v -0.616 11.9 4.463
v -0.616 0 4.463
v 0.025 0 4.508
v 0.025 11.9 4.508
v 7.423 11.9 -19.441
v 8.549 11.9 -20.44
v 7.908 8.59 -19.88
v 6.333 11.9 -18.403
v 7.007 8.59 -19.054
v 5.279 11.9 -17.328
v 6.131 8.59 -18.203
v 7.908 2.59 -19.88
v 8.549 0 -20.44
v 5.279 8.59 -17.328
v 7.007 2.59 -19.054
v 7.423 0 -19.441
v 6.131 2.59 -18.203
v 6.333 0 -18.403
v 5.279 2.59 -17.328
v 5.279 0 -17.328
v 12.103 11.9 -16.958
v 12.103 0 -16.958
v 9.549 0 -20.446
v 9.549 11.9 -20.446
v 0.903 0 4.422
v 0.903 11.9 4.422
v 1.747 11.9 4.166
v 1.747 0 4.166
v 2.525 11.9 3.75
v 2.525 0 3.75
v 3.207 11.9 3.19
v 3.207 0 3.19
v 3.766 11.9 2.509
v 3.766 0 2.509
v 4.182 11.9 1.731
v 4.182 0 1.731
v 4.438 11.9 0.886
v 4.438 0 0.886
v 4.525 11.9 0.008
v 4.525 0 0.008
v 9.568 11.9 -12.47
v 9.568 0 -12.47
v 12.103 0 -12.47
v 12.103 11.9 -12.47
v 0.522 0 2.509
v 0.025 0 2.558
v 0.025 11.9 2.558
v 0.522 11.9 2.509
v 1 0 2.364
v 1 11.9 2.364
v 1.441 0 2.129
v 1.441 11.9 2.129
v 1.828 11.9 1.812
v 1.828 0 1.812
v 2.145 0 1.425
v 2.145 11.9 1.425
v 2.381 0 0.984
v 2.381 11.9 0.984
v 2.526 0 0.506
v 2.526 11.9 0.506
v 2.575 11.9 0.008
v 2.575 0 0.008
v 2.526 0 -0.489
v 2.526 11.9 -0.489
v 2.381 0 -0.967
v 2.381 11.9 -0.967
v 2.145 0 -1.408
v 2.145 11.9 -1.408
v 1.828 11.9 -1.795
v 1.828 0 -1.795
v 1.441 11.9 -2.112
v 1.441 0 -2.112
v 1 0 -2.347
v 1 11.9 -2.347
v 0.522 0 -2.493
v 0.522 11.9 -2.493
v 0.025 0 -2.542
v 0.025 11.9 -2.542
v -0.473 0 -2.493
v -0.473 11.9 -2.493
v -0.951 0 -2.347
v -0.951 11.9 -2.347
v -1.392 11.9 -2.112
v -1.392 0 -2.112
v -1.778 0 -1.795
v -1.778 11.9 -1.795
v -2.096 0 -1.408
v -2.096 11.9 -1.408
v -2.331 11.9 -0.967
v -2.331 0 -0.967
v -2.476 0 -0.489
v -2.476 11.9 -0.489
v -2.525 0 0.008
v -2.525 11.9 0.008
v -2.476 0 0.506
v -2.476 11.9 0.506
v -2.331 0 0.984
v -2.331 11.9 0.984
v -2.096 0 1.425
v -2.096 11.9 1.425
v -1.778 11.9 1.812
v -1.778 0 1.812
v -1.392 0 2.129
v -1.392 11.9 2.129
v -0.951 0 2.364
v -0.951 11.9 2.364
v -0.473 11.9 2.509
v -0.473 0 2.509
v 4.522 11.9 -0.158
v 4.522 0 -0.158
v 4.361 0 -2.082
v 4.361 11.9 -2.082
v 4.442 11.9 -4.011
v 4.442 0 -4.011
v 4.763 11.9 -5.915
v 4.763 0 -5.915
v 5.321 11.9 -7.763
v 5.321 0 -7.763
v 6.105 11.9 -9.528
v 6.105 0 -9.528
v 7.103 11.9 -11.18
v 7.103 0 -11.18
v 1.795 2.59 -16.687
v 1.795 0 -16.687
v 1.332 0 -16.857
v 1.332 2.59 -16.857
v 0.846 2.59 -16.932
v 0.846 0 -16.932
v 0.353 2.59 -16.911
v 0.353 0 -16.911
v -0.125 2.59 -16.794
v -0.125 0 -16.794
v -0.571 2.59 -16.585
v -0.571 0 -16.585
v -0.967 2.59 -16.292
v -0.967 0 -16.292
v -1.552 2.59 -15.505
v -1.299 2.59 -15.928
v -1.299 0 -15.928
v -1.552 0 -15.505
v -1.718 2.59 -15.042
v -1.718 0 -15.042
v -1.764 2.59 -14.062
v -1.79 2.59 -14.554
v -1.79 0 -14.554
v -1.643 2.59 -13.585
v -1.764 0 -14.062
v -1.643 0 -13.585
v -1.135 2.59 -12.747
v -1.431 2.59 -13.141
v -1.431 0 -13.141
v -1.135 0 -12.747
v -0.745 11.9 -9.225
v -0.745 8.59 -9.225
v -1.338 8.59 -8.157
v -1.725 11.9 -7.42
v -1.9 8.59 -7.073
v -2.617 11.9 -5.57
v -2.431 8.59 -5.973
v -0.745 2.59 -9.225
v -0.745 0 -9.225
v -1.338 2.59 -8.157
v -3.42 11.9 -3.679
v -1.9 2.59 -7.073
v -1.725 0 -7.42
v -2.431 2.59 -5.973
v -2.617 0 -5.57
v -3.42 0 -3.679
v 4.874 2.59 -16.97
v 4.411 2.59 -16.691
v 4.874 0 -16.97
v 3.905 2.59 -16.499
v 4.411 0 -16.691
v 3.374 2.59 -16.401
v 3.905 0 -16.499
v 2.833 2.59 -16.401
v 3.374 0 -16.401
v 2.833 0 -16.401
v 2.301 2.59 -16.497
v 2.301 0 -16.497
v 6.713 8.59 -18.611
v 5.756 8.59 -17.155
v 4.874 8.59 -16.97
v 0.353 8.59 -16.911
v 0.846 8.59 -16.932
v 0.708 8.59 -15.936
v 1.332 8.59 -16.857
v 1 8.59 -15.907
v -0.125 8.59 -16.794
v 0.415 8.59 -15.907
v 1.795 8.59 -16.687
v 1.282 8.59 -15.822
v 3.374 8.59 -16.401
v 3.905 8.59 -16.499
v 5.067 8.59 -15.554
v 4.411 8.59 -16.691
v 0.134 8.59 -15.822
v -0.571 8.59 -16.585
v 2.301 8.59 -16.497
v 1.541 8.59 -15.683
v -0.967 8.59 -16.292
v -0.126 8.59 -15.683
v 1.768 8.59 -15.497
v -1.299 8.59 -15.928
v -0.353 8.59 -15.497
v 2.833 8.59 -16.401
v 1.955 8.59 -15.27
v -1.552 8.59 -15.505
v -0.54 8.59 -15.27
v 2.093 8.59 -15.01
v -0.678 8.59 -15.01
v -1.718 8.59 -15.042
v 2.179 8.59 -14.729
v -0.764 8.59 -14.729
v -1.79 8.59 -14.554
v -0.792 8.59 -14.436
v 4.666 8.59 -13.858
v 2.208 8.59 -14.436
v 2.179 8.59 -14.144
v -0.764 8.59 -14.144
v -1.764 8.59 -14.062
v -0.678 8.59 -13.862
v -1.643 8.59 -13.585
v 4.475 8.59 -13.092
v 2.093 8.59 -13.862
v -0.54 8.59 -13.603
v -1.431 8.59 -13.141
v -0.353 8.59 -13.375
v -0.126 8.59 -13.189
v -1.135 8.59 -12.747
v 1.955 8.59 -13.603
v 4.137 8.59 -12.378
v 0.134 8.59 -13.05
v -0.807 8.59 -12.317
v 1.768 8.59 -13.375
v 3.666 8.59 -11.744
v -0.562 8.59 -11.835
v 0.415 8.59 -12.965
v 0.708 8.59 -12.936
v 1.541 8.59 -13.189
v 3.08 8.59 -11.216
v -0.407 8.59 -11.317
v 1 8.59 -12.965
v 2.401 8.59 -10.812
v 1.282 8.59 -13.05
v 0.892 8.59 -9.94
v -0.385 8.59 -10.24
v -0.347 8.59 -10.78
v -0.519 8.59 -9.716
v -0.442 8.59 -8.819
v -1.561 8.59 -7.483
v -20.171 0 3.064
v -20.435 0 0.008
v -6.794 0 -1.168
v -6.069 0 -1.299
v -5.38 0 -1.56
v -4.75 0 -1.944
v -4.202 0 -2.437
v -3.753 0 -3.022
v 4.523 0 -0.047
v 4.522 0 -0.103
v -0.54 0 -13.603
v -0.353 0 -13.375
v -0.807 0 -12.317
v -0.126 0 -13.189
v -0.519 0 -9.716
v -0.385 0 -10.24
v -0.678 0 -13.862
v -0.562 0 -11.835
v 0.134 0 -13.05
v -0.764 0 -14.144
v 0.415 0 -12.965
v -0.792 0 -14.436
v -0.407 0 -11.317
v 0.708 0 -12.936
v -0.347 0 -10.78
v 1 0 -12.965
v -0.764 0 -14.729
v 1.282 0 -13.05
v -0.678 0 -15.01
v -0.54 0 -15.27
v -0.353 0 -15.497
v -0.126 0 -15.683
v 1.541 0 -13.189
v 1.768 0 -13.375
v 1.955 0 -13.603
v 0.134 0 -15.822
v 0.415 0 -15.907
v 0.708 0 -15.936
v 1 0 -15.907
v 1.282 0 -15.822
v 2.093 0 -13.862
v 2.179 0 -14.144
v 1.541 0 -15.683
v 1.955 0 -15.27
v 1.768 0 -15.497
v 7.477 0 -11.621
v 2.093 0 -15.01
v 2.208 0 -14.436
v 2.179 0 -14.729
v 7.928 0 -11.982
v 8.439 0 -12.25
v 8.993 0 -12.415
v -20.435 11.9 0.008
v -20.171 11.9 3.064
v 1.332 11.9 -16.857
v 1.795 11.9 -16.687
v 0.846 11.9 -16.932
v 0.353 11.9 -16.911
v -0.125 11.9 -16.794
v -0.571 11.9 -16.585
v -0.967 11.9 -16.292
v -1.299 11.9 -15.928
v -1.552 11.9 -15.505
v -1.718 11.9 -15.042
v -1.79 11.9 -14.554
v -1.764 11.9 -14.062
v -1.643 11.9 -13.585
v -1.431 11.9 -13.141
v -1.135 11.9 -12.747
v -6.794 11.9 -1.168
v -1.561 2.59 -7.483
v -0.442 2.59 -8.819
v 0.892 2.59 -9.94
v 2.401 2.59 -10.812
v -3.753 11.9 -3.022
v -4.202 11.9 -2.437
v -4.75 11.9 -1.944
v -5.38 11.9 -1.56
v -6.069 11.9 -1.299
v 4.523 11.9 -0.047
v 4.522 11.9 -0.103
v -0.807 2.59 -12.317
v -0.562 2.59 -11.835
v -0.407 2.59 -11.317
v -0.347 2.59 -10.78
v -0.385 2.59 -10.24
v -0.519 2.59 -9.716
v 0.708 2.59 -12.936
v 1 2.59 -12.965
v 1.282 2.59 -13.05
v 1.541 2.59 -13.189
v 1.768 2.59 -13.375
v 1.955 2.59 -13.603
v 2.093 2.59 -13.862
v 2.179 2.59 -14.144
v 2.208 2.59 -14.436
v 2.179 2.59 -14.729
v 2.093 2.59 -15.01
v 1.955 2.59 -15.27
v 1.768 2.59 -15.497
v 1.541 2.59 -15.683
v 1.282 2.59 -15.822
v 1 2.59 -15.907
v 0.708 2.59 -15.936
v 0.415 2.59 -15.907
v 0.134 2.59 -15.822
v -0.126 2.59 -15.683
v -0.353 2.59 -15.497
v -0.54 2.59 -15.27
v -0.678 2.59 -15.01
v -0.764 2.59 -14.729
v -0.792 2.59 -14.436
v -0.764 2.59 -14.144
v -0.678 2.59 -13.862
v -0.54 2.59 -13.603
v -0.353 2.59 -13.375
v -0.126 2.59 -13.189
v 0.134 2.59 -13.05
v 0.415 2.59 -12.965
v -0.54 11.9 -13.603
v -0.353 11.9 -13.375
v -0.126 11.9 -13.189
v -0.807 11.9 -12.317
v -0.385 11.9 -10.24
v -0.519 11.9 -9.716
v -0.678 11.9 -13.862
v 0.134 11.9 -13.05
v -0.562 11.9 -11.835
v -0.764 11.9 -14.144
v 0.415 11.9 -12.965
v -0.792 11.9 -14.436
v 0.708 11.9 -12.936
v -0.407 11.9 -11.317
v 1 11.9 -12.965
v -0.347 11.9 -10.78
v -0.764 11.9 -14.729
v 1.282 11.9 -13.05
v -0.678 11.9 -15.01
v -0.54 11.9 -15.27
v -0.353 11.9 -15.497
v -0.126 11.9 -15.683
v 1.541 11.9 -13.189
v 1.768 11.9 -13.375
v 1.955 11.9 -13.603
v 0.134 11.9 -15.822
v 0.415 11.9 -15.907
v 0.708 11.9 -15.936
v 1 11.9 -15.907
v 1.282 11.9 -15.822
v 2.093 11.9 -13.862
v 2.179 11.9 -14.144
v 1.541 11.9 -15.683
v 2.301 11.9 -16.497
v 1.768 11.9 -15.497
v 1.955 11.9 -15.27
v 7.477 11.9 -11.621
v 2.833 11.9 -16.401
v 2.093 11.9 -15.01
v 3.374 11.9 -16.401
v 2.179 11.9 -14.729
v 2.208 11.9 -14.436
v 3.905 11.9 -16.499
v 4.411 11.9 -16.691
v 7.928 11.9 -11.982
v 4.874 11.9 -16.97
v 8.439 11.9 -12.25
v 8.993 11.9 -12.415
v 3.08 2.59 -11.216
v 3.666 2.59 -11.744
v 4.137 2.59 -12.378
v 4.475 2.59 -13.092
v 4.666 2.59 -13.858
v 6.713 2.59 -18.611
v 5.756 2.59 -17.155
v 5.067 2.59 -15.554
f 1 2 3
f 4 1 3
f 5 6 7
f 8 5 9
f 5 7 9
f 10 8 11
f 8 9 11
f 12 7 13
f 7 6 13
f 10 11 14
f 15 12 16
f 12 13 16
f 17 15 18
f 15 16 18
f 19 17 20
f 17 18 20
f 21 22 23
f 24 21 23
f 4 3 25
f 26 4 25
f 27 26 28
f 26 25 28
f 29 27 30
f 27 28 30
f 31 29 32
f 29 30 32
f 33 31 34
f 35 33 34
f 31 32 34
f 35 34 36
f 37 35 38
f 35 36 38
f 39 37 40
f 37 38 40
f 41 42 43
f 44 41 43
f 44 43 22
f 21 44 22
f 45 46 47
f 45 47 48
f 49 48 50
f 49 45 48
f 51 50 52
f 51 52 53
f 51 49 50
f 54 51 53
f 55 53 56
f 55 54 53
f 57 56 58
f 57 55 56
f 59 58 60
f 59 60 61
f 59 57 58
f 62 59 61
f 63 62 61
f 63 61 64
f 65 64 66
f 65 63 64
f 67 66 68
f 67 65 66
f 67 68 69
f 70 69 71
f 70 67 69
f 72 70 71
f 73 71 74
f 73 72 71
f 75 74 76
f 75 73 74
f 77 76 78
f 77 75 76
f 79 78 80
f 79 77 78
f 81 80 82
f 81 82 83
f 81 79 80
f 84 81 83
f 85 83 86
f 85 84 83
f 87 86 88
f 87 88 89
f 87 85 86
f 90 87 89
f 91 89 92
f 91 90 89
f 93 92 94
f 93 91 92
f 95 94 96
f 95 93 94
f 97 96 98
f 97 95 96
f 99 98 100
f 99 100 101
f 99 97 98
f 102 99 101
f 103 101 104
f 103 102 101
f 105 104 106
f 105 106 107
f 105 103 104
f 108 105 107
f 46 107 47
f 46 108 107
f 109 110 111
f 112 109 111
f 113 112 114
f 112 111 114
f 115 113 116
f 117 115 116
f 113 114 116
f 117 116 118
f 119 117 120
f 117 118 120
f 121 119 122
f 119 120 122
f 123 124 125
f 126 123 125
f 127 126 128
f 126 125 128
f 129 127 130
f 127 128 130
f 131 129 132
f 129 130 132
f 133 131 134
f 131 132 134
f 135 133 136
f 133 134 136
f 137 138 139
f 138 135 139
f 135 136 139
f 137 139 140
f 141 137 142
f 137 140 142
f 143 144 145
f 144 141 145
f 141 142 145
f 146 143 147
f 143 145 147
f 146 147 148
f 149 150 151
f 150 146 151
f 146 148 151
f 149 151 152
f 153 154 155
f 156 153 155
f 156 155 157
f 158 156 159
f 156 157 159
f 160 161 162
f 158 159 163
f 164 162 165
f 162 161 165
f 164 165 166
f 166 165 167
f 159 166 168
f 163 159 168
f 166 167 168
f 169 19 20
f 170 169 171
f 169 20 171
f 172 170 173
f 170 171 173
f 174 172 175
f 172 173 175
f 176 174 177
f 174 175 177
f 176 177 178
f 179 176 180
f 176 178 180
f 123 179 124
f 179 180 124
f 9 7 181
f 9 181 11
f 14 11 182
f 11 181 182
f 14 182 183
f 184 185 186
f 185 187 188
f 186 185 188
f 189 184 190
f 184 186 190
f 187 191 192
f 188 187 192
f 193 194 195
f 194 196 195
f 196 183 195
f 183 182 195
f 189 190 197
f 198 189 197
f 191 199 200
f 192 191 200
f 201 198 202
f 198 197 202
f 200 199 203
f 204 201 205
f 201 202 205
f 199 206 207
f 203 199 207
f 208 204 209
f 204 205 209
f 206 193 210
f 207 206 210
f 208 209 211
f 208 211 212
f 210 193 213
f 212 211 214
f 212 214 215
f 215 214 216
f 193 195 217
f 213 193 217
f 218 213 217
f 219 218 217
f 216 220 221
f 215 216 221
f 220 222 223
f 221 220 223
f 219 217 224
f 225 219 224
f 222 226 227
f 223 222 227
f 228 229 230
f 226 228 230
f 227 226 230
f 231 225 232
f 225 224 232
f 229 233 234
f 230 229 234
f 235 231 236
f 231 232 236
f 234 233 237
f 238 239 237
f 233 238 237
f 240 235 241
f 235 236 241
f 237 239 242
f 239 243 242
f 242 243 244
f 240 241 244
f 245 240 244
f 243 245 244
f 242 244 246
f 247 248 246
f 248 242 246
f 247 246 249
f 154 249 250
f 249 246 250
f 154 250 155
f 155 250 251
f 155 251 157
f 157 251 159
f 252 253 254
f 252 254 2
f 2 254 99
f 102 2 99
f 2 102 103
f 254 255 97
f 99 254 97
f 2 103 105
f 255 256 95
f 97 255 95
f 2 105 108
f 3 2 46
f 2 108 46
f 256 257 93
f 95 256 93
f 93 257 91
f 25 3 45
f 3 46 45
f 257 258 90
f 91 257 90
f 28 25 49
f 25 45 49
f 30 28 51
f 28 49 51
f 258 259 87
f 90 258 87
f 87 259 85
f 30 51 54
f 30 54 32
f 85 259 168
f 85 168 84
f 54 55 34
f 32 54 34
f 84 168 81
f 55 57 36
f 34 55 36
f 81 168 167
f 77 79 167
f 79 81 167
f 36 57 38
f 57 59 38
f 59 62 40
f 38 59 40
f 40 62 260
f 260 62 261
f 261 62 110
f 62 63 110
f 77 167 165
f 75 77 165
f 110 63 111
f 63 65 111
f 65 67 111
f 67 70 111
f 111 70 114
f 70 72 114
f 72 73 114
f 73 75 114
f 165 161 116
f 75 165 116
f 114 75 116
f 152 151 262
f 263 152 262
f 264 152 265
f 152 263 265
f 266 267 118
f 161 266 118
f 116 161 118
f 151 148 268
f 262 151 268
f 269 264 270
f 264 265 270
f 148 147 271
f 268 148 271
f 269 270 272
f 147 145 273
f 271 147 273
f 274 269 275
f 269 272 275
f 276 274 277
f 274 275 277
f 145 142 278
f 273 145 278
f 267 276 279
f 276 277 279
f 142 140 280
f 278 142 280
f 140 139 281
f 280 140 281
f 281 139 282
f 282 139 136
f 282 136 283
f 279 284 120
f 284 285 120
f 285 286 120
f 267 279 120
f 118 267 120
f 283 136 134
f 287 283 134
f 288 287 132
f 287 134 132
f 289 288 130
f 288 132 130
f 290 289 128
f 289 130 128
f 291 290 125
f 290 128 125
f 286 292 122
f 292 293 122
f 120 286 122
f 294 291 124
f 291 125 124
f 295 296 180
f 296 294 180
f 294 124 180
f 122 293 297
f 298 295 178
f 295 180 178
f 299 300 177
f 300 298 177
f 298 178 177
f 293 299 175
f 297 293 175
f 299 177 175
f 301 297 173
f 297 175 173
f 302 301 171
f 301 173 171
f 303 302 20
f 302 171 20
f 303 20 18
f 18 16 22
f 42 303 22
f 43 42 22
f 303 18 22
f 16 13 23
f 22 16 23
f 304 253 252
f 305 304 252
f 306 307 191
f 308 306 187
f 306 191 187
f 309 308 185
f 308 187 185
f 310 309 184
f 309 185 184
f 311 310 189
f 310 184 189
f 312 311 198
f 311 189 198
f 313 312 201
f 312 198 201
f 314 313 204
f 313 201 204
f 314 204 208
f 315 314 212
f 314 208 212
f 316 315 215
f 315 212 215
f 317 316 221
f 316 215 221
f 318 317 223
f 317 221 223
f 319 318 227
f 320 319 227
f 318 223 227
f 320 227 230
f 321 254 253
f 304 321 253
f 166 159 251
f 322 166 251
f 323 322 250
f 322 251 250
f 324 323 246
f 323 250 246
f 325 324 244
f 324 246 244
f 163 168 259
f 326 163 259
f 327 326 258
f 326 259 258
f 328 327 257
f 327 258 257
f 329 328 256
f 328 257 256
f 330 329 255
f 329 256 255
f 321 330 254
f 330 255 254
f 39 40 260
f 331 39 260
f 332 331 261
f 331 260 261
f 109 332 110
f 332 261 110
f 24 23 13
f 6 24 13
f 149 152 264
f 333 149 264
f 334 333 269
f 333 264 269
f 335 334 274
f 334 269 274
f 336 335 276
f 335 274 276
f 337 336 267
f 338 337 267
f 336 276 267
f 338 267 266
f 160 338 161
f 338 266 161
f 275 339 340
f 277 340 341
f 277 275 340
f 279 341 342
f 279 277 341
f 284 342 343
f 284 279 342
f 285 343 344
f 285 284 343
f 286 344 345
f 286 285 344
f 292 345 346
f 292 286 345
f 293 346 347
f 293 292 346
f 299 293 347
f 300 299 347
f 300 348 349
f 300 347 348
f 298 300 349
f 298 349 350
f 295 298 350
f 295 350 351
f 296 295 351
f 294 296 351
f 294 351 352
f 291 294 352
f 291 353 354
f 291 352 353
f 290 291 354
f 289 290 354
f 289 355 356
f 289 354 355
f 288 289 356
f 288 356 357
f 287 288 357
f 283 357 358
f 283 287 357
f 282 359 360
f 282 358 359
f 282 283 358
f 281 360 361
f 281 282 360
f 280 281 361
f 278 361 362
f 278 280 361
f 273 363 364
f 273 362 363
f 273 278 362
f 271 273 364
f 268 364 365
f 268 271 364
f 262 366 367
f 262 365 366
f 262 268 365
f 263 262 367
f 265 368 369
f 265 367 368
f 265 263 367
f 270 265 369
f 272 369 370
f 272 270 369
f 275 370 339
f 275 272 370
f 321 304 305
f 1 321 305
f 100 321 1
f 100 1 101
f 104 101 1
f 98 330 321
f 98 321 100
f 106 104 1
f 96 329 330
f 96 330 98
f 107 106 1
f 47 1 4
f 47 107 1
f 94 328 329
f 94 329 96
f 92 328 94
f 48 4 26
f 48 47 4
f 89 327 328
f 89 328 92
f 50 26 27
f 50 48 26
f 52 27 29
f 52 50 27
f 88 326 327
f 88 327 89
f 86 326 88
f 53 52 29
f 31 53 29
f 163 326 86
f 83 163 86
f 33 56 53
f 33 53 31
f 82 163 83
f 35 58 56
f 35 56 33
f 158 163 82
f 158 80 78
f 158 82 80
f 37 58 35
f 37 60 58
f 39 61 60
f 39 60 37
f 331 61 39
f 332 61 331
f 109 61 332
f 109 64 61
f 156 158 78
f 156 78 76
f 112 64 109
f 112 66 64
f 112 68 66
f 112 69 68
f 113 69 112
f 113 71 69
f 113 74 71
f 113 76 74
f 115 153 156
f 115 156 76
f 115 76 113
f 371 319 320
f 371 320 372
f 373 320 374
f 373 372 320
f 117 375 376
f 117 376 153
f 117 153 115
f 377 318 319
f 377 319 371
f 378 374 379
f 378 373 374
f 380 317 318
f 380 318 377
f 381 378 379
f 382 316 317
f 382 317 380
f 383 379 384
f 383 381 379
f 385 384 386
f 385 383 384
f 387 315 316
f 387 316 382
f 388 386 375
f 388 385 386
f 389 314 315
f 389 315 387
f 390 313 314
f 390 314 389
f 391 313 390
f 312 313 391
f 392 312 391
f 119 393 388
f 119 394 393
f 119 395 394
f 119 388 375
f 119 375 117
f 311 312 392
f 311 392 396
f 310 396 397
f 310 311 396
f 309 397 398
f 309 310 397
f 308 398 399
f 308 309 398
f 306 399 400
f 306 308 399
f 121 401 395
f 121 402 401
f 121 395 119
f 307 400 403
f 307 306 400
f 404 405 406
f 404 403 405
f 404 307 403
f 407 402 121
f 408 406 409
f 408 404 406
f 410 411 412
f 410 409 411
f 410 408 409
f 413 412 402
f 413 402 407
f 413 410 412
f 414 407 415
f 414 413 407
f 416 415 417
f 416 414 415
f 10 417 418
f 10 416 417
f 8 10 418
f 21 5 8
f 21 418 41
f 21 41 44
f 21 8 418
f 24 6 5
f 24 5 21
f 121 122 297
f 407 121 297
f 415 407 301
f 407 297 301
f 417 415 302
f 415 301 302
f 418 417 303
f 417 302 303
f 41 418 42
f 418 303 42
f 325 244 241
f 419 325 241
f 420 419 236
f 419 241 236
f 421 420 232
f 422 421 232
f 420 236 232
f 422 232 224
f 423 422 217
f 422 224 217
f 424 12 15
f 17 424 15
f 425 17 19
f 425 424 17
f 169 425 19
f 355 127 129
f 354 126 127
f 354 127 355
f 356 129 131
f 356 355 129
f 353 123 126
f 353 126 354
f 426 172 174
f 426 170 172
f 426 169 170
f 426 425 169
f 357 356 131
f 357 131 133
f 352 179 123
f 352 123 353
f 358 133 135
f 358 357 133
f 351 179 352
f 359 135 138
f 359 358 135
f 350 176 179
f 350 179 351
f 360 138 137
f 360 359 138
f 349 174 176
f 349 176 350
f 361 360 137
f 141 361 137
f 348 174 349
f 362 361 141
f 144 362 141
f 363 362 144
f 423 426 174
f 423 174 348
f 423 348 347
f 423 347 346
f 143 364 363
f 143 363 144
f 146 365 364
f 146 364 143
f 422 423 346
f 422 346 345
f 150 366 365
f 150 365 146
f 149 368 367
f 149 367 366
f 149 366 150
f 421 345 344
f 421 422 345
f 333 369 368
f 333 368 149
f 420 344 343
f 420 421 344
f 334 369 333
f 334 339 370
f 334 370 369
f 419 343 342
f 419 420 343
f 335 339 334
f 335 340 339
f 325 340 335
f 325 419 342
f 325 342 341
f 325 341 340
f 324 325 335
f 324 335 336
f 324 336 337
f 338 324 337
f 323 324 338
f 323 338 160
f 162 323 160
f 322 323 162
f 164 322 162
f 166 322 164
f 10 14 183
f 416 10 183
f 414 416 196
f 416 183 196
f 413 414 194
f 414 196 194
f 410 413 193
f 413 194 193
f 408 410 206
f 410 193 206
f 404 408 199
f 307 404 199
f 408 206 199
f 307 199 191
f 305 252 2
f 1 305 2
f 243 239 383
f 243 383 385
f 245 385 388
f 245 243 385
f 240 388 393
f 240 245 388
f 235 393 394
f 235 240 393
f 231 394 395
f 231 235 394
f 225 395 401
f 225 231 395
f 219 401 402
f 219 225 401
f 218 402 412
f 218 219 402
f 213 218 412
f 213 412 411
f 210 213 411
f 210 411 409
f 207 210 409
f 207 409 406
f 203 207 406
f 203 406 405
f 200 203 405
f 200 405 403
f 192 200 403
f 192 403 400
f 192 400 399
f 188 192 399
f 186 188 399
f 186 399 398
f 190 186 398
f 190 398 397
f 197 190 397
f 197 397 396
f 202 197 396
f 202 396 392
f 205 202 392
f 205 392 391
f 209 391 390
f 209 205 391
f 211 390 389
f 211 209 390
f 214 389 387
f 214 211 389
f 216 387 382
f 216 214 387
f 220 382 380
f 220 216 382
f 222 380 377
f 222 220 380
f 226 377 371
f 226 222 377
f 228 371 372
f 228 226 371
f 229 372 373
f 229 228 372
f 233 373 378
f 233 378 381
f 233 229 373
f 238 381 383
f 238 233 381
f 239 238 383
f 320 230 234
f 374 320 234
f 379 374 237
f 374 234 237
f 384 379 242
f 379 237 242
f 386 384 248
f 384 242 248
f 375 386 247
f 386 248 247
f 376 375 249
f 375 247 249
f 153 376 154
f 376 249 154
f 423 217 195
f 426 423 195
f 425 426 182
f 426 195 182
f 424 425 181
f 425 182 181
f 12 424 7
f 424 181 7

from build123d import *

# Parameters (mm, degrees)
SKETCH1_R           = 2.55
SKETCH1_R_2         = 1.5
BOSS_EXTRUDE1_DEPTH = 11.9
SKETCH2_R           = 4
CUT_EXTRUDE1_DEPTH  = 3
FILLET1_R           = 10


with BuildPart() as part:
    # Sketch1 → Boss-Extrude1 (new body)
    with BuildSketch(Plane(origin=(0, 0, 0), x_dir=(1, 0, 0), z_dir=(0, 1, 0))):
        with BuildLine():
            Line((9.548719517, 20.446351577), (8.548719517, 20.439520648))
            ThreePointArc((8.548719517, 20.439520648), (6.873073378, 18.92667054), (5.279413844, 17.32768501))
            ThreePointArc((5.279413844, 17.32768501), (3.641729047, 16.438171118), (1.79479604, 16.687339585))
            ThreePointArc((1.79479604, 16.687339585), (-1.298720161, 15.927784086), (-1.135127046, 12.74658866))
            ThreePointArc((-1.135127046, 12.74658866), (-0.36458096, 11.049678177), (-0.744733852, 9.225197364))
            ThreePointArc((-0.744733852, 9.225197364), (-2.181853542, 6.500169129), (-3.4195031, 3.678943251))
            ThreePointArc((-3.4195031, 3.678943251), (-4.750151746, 1.944049699), (-6.794216917, 1.167983317))
            Line((-6.794216917, 1.167983317), (-20.434932532, -0.008444123))
            Line((-20.434932532, -0.008444123), (-20.171389856, -3.064230295))
            Line((-20.171389856, -3.064230295), (-0.61568325, -4.46265538))
            Line((-0.61568325, -4.46265538), (0.024630797, -4.508444123))
            ThreePointArc((0.024630797, -4.508444123), (3.206611312, -3.190424639), (4.524630797, -0.008444123))
            ThreePointArc((4.524630797, -0.008444123), (4.522964187, 0.074936031), (4.52153968, 0.158320674))
            ThreePointArc((4.52153968, 0.158320674), (4.763290961, 5.914837028), (7.103103866, 11.179929599))
            ThreePointArc((7.103103866, 11.179929599), (8.177074896, 12.128306877), (9.568395932, 12.47044575))
            Line((9.568395932, 12.47044575), (12.103260685, 12.47044575))
            Line((12.103260685, 12.47044575), (12.103260685, 16.957695738))
            Line((12.103260685, 16.957695738), (9.548719517, 20.446351577))
        make_face()
        with Locations(Location((0.024630797, -0.008444123, 0), (0, 0, 270))):
            Circle(SKETCH1_R, mode=Mode.SUBTRACT)
        with Locations(Location((0.707528049, 14.436151384, 0), (0, 0, 270))):
            Circle(SKETCH1_R_2, mode=Mode.SUBTRACT)
    extrude(amount=BOSS_EXTRUDE1_DEPTH)

    # Sketch2 → Cut-Extrude1 (cut, symmetric)
    with BuildSketch(Plane(origin=(0, 5.59, 0), x_dir=(1, 0, 0), z_dir=(0, 1, 0))):
        with Locations((0.707528049, 14.436151384)):
            Circle(SKETCH2_R)
    extrude(amount=CUT_EXTRUDE1_DEPTH, both=True, mode=Mode.SUBTRACT)

    # Fillet1
    # the kernel refuses this fillet: 10 mm, written as the material it takes off along each edge
    with BuildSketch(Plane(origin=(4.097372756, 8.59, -16.55958089), x_dir=(0.7539501243329342, 0, -0.6569316631266551), z_dir=(0, -1, 0))) as fillet1_piece_1:
        with BuildLine():
            CenterArc((5.165347529, 9.999376692), FILLET1_R, 229.371801611, 39.988476575)
            Line((-1.346130645, 2.409867354), (-1.997278462, 1.650916421))
            ThreePointArc((-1.997278462, 1.650916421), (-1.331632365, 0.837063937), (-0.987680479, -0.156484095))
            Line((-0.987680479, -0.156484095), (0.368749302, -0.929528887))
            ThreePointArc((0.368749302, -0.929528887), (1.299277263, -0.79792354), (5.042532309, -0.999937669))
            Line((5.042532309, -0.999937669), (5.053697329, 0))
        make_face()
    extrude(amount=6, mode=Mode.SUBTRACT)
    with BuildSketch(Plane(origin=(-0.34961624, 8.59, -10.578374051), x_dir=(-0.41195039334505656, 0, 0.9112062738056916), z_dir=(0, -1, 0))) as fillet1_piece_2:
        with BuildLine():
            CenterArc((5.165347529, -9.999376692), FILLET1_R, 90.639721814, 39.988476575)
            Line((-1.346130645, -2.409867354), (-1.997278462, -1.650916421))
            ThreePointArc((-1.997278462, -1.650916421), (-1.331632365, -0.837063937), (-0.987680479, 0.156484095))
            Line((-0.987680479, 0.156484095), (0.368749302, 0.929528887))
            ThreePointArc((0.368749302, 0.929528887), (1.299277263, 0.79792354), (5.042532309, 0.999937669))
            Line((5.042532309, 0.999937669), (5.053697329, 0))
        make_face()
    extrude(amount=6, mode=Mode.SUBTRACT)


solid = part.part
